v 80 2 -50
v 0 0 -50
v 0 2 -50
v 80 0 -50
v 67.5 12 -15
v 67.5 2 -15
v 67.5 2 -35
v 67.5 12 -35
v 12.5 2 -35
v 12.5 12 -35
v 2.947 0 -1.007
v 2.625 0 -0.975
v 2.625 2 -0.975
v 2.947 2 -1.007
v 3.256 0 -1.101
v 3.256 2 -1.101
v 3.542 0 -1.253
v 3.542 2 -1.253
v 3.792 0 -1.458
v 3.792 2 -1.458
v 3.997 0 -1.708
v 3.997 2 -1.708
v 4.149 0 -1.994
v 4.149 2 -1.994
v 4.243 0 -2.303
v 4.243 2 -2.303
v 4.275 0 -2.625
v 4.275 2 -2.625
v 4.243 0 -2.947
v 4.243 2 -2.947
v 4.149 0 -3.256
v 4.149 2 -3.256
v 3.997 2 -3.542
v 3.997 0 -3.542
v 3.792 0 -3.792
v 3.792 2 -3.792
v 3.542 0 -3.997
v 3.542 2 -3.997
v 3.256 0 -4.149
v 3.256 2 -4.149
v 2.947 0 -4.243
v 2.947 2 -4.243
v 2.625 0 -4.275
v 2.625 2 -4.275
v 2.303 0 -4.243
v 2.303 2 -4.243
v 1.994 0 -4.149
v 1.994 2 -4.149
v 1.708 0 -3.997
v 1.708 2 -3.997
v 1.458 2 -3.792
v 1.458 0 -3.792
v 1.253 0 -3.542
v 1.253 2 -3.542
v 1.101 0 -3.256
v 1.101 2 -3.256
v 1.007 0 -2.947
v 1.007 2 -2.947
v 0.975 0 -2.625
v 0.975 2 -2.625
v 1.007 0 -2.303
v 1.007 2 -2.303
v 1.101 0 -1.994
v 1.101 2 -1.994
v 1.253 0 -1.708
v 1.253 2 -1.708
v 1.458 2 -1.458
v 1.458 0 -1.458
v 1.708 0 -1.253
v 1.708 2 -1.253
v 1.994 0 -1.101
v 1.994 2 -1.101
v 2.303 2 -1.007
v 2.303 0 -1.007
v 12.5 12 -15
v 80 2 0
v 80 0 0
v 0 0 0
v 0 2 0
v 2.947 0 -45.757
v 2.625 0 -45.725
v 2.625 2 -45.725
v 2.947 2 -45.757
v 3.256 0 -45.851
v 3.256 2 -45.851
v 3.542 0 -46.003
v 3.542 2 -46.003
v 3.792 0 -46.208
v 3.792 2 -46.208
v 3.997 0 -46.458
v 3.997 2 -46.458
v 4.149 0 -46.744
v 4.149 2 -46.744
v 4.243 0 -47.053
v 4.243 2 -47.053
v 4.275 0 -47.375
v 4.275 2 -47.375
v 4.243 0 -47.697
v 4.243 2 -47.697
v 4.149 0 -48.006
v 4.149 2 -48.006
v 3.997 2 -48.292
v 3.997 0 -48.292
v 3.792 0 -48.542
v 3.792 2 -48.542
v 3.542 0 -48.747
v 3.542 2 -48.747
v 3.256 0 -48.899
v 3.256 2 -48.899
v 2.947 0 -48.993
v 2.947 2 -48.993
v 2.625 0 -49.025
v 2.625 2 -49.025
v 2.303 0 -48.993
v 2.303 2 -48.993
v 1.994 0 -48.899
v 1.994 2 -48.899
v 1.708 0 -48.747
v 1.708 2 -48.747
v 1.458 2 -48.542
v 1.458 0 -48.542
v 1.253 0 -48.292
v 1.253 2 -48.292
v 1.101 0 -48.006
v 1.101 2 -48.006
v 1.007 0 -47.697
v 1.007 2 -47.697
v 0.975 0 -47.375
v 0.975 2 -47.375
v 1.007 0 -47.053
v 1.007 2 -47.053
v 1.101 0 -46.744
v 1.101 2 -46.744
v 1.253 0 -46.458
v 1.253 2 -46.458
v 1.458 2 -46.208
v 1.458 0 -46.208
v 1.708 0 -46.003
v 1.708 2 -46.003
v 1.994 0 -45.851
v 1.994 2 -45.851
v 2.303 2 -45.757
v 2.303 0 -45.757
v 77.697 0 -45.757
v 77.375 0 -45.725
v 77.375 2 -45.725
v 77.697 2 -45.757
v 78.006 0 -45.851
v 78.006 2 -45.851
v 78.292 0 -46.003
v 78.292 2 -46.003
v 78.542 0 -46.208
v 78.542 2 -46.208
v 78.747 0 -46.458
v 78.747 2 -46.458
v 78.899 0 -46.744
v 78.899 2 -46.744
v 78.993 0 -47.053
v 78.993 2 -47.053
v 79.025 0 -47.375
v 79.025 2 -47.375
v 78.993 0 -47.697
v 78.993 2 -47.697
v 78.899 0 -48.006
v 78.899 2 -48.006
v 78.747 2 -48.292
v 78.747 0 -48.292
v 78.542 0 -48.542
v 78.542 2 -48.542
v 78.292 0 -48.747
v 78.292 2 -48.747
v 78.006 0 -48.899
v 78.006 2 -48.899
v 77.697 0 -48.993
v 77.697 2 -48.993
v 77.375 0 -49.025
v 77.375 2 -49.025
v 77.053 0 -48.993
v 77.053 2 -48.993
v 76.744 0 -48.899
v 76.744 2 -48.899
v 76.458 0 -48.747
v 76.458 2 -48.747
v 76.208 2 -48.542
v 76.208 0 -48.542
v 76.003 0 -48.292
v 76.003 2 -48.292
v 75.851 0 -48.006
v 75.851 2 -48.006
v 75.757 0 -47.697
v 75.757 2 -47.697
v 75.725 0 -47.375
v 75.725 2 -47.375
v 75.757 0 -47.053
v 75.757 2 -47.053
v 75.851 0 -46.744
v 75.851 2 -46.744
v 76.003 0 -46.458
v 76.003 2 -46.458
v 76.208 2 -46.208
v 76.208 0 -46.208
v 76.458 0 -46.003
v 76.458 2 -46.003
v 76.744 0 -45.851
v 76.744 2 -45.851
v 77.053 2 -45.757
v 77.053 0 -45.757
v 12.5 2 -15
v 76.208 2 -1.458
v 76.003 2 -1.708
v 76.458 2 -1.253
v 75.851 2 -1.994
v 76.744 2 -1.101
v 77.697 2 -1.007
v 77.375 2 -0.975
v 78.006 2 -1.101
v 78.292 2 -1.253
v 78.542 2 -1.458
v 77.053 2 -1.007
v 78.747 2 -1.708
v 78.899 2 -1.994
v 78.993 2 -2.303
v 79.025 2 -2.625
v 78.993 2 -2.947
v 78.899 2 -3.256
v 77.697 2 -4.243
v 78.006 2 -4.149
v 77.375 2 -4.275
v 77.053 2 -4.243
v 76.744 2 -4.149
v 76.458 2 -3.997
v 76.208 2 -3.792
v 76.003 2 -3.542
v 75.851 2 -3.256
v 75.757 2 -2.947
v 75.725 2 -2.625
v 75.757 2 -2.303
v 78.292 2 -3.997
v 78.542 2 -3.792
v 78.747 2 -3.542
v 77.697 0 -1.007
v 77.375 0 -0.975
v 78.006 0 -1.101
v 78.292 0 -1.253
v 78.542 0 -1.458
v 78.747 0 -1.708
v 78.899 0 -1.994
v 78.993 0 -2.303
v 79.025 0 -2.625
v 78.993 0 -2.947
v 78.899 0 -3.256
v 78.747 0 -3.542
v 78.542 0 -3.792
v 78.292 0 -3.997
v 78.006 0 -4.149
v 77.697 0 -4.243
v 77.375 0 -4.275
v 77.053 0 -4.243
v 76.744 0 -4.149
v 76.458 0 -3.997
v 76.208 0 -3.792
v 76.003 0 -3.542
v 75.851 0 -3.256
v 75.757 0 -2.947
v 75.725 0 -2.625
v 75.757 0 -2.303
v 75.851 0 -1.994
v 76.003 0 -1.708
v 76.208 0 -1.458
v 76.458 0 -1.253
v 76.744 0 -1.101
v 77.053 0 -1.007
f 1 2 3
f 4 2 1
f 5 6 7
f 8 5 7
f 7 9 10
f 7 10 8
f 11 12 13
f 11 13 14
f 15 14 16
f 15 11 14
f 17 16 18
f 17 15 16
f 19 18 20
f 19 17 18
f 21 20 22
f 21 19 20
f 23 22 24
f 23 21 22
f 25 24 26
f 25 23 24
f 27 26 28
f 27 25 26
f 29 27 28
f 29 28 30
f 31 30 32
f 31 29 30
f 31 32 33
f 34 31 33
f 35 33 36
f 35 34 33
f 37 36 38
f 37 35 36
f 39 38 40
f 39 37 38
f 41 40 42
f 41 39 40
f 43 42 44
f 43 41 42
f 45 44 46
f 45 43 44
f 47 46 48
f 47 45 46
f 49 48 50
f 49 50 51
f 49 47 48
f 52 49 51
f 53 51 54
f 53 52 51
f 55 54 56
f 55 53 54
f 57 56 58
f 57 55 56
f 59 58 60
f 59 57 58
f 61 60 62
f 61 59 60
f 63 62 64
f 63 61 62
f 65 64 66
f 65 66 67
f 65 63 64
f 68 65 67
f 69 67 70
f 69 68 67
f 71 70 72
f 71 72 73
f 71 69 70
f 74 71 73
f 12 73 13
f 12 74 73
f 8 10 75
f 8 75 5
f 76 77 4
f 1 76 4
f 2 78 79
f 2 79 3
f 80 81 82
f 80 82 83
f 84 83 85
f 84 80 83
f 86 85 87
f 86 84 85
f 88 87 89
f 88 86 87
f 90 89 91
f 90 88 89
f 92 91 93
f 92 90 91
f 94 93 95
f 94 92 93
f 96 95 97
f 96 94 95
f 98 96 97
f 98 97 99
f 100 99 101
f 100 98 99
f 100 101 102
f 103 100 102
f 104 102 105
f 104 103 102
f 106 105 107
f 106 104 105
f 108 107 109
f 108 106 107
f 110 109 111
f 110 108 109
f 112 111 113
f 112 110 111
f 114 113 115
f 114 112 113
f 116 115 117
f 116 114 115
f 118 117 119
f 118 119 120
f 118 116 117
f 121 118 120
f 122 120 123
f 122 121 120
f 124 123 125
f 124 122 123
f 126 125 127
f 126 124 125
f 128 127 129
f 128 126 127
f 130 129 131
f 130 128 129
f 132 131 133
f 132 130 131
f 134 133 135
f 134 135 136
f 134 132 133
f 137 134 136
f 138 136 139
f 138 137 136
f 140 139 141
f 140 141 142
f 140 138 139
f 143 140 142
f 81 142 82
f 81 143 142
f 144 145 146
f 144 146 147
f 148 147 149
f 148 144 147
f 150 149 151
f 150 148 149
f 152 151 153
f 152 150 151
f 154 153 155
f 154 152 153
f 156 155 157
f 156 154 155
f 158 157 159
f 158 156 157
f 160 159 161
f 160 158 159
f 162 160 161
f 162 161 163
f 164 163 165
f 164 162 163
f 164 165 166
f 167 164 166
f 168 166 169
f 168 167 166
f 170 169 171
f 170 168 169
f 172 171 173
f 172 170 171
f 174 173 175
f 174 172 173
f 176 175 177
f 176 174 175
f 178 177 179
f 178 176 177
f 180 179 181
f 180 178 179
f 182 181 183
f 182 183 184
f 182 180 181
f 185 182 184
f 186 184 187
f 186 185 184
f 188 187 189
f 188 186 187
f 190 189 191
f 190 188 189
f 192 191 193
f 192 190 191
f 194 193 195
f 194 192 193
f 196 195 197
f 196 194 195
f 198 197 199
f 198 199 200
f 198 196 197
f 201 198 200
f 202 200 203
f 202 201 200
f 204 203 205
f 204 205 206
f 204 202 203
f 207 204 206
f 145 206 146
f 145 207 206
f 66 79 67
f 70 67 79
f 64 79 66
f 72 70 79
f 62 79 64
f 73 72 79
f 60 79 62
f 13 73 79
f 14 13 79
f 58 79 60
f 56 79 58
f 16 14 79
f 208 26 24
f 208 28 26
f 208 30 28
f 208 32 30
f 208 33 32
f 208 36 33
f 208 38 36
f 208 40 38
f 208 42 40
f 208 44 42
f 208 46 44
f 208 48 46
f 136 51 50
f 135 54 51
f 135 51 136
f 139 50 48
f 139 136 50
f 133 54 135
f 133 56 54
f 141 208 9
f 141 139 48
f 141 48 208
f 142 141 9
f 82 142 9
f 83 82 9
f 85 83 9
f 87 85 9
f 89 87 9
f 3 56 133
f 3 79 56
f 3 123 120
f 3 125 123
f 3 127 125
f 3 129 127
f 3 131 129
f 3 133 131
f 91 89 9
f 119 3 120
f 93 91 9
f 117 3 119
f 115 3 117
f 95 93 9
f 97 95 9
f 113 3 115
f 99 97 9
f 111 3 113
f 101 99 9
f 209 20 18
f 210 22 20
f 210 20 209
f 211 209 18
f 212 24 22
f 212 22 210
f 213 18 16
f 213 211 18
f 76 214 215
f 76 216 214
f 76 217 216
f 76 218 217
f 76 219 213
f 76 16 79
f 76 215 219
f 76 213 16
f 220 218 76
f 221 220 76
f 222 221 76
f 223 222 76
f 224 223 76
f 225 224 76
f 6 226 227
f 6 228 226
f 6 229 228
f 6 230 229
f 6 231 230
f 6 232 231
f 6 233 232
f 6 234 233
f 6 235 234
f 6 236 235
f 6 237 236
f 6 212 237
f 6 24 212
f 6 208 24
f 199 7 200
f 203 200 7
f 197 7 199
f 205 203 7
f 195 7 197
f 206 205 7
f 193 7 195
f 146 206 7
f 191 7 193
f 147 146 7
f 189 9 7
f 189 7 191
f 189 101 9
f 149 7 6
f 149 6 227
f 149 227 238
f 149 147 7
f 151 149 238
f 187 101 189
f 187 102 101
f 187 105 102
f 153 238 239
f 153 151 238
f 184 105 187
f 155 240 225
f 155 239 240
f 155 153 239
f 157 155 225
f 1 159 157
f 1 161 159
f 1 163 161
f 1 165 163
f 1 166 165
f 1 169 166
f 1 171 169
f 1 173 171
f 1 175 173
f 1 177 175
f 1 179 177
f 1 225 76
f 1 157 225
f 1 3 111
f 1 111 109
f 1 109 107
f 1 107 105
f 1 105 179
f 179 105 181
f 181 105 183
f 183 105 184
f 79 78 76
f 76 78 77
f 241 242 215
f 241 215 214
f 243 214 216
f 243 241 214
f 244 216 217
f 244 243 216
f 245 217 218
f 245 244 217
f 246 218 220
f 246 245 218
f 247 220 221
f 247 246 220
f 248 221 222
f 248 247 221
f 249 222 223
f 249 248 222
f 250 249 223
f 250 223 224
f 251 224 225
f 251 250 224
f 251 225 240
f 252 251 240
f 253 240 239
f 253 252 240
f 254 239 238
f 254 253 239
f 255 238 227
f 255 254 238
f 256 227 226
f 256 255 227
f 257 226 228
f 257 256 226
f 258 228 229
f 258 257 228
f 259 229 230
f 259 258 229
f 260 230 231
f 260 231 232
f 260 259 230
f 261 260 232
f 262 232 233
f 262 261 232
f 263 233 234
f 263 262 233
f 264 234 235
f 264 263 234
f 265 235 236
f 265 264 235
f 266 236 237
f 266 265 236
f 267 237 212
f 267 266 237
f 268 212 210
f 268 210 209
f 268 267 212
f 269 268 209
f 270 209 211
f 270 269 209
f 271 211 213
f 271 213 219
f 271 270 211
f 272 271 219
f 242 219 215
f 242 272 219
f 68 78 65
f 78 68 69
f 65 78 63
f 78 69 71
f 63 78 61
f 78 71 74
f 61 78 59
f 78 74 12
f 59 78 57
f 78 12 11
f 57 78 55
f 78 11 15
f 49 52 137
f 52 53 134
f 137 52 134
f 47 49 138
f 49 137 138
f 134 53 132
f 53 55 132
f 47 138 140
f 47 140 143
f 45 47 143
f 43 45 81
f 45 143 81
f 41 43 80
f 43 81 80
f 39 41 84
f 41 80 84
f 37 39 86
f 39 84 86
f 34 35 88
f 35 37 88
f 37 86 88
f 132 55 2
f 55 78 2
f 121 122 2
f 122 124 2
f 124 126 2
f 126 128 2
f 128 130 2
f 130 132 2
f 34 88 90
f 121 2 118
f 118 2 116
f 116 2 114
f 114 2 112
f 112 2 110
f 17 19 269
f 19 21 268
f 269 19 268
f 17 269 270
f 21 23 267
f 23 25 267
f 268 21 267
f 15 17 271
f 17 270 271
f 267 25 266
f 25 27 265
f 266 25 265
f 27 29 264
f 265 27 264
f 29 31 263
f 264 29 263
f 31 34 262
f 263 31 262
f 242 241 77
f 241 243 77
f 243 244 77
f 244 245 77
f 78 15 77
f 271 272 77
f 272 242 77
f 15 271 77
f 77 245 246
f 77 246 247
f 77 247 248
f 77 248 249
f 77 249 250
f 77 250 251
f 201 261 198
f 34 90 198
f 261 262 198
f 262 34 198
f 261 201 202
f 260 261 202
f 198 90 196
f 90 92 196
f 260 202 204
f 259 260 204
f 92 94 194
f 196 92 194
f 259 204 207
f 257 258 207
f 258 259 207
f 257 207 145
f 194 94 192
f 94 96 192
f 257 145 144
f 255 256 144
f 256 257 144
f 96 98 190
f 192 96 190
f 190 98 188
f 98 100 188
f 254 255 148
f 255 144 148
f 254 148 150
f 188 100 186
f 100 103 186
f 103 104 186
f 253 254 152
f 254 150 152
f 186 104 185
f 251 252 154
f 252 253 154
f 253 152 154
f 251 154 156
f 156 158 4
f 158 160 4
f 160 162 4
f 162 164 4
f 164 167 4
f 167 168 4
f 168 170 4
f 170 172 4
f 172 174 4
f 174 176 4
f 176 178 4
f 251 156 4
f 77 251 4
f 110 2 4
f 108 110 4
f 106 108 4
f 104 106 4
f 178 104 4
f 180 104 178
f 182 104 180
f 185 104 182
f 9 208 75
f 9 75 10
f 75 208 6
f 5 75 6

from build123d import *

# Parameters (mm, degrees)
SKETCH1_W           = 80
SKETCH1_H           = 50
SKETCH1_R           = 1.65
BOSS_EXTRUDE1_DEPTH = 2
SKETCH2_W           = 55
SKETCH2_H           = 20
BOSS_EXTRUDE2_DEPTH = 10


with BuildPart() as part:
    # Sketch1 → Boss-Extrude1 (new body)
    with BuildSketch(Plane(origin=(0, 0, 0), x_dir=(1, 0, 0), z_dir=(0, 1, 0))):
        with Locations((40, 25)):
            Rectangle(SKETCH1_W, SKETCH1_H)
        with Locations(Location((2.625, 2.625, 0), (0, 0, 270))):
            Circle(SKETCH1_R, mode=Mode.SUBTRACT)
        with Locations(Location((77.375, 2.625, 0), (0, 0, 270))):
            Circle(SKETCH1_R, mode=Mode.SUBTRACT)
        with Locations(Location((2.625, 47.375, 0), (0, 0, 270))):
            Circle(SKETCH1_R, mode=Mode.SUBTRACT)
        with Locations(Location((77.375, 47.375, 0), (0, 0, 270))):
            Circle(SKETCH1_R, mode=Mode.SUBTRACT)
    extrude(amount=BOSS_EXTRUDE1_DEPTH)

    # Sketch2 → Boss-Extrude2 (add)
    with BuildSketch(Plane(origin=(0, 2, 0), x_dir=(1, 0, 0), z_dir=(0, 1, 0))):
        with Locations((40, 25)):
            Rectangle(SKETCH2_W, SKETCH2_H)
    extrude(amount=BOSS_EXTRUDE2_DEPTH)


solid = part.part
